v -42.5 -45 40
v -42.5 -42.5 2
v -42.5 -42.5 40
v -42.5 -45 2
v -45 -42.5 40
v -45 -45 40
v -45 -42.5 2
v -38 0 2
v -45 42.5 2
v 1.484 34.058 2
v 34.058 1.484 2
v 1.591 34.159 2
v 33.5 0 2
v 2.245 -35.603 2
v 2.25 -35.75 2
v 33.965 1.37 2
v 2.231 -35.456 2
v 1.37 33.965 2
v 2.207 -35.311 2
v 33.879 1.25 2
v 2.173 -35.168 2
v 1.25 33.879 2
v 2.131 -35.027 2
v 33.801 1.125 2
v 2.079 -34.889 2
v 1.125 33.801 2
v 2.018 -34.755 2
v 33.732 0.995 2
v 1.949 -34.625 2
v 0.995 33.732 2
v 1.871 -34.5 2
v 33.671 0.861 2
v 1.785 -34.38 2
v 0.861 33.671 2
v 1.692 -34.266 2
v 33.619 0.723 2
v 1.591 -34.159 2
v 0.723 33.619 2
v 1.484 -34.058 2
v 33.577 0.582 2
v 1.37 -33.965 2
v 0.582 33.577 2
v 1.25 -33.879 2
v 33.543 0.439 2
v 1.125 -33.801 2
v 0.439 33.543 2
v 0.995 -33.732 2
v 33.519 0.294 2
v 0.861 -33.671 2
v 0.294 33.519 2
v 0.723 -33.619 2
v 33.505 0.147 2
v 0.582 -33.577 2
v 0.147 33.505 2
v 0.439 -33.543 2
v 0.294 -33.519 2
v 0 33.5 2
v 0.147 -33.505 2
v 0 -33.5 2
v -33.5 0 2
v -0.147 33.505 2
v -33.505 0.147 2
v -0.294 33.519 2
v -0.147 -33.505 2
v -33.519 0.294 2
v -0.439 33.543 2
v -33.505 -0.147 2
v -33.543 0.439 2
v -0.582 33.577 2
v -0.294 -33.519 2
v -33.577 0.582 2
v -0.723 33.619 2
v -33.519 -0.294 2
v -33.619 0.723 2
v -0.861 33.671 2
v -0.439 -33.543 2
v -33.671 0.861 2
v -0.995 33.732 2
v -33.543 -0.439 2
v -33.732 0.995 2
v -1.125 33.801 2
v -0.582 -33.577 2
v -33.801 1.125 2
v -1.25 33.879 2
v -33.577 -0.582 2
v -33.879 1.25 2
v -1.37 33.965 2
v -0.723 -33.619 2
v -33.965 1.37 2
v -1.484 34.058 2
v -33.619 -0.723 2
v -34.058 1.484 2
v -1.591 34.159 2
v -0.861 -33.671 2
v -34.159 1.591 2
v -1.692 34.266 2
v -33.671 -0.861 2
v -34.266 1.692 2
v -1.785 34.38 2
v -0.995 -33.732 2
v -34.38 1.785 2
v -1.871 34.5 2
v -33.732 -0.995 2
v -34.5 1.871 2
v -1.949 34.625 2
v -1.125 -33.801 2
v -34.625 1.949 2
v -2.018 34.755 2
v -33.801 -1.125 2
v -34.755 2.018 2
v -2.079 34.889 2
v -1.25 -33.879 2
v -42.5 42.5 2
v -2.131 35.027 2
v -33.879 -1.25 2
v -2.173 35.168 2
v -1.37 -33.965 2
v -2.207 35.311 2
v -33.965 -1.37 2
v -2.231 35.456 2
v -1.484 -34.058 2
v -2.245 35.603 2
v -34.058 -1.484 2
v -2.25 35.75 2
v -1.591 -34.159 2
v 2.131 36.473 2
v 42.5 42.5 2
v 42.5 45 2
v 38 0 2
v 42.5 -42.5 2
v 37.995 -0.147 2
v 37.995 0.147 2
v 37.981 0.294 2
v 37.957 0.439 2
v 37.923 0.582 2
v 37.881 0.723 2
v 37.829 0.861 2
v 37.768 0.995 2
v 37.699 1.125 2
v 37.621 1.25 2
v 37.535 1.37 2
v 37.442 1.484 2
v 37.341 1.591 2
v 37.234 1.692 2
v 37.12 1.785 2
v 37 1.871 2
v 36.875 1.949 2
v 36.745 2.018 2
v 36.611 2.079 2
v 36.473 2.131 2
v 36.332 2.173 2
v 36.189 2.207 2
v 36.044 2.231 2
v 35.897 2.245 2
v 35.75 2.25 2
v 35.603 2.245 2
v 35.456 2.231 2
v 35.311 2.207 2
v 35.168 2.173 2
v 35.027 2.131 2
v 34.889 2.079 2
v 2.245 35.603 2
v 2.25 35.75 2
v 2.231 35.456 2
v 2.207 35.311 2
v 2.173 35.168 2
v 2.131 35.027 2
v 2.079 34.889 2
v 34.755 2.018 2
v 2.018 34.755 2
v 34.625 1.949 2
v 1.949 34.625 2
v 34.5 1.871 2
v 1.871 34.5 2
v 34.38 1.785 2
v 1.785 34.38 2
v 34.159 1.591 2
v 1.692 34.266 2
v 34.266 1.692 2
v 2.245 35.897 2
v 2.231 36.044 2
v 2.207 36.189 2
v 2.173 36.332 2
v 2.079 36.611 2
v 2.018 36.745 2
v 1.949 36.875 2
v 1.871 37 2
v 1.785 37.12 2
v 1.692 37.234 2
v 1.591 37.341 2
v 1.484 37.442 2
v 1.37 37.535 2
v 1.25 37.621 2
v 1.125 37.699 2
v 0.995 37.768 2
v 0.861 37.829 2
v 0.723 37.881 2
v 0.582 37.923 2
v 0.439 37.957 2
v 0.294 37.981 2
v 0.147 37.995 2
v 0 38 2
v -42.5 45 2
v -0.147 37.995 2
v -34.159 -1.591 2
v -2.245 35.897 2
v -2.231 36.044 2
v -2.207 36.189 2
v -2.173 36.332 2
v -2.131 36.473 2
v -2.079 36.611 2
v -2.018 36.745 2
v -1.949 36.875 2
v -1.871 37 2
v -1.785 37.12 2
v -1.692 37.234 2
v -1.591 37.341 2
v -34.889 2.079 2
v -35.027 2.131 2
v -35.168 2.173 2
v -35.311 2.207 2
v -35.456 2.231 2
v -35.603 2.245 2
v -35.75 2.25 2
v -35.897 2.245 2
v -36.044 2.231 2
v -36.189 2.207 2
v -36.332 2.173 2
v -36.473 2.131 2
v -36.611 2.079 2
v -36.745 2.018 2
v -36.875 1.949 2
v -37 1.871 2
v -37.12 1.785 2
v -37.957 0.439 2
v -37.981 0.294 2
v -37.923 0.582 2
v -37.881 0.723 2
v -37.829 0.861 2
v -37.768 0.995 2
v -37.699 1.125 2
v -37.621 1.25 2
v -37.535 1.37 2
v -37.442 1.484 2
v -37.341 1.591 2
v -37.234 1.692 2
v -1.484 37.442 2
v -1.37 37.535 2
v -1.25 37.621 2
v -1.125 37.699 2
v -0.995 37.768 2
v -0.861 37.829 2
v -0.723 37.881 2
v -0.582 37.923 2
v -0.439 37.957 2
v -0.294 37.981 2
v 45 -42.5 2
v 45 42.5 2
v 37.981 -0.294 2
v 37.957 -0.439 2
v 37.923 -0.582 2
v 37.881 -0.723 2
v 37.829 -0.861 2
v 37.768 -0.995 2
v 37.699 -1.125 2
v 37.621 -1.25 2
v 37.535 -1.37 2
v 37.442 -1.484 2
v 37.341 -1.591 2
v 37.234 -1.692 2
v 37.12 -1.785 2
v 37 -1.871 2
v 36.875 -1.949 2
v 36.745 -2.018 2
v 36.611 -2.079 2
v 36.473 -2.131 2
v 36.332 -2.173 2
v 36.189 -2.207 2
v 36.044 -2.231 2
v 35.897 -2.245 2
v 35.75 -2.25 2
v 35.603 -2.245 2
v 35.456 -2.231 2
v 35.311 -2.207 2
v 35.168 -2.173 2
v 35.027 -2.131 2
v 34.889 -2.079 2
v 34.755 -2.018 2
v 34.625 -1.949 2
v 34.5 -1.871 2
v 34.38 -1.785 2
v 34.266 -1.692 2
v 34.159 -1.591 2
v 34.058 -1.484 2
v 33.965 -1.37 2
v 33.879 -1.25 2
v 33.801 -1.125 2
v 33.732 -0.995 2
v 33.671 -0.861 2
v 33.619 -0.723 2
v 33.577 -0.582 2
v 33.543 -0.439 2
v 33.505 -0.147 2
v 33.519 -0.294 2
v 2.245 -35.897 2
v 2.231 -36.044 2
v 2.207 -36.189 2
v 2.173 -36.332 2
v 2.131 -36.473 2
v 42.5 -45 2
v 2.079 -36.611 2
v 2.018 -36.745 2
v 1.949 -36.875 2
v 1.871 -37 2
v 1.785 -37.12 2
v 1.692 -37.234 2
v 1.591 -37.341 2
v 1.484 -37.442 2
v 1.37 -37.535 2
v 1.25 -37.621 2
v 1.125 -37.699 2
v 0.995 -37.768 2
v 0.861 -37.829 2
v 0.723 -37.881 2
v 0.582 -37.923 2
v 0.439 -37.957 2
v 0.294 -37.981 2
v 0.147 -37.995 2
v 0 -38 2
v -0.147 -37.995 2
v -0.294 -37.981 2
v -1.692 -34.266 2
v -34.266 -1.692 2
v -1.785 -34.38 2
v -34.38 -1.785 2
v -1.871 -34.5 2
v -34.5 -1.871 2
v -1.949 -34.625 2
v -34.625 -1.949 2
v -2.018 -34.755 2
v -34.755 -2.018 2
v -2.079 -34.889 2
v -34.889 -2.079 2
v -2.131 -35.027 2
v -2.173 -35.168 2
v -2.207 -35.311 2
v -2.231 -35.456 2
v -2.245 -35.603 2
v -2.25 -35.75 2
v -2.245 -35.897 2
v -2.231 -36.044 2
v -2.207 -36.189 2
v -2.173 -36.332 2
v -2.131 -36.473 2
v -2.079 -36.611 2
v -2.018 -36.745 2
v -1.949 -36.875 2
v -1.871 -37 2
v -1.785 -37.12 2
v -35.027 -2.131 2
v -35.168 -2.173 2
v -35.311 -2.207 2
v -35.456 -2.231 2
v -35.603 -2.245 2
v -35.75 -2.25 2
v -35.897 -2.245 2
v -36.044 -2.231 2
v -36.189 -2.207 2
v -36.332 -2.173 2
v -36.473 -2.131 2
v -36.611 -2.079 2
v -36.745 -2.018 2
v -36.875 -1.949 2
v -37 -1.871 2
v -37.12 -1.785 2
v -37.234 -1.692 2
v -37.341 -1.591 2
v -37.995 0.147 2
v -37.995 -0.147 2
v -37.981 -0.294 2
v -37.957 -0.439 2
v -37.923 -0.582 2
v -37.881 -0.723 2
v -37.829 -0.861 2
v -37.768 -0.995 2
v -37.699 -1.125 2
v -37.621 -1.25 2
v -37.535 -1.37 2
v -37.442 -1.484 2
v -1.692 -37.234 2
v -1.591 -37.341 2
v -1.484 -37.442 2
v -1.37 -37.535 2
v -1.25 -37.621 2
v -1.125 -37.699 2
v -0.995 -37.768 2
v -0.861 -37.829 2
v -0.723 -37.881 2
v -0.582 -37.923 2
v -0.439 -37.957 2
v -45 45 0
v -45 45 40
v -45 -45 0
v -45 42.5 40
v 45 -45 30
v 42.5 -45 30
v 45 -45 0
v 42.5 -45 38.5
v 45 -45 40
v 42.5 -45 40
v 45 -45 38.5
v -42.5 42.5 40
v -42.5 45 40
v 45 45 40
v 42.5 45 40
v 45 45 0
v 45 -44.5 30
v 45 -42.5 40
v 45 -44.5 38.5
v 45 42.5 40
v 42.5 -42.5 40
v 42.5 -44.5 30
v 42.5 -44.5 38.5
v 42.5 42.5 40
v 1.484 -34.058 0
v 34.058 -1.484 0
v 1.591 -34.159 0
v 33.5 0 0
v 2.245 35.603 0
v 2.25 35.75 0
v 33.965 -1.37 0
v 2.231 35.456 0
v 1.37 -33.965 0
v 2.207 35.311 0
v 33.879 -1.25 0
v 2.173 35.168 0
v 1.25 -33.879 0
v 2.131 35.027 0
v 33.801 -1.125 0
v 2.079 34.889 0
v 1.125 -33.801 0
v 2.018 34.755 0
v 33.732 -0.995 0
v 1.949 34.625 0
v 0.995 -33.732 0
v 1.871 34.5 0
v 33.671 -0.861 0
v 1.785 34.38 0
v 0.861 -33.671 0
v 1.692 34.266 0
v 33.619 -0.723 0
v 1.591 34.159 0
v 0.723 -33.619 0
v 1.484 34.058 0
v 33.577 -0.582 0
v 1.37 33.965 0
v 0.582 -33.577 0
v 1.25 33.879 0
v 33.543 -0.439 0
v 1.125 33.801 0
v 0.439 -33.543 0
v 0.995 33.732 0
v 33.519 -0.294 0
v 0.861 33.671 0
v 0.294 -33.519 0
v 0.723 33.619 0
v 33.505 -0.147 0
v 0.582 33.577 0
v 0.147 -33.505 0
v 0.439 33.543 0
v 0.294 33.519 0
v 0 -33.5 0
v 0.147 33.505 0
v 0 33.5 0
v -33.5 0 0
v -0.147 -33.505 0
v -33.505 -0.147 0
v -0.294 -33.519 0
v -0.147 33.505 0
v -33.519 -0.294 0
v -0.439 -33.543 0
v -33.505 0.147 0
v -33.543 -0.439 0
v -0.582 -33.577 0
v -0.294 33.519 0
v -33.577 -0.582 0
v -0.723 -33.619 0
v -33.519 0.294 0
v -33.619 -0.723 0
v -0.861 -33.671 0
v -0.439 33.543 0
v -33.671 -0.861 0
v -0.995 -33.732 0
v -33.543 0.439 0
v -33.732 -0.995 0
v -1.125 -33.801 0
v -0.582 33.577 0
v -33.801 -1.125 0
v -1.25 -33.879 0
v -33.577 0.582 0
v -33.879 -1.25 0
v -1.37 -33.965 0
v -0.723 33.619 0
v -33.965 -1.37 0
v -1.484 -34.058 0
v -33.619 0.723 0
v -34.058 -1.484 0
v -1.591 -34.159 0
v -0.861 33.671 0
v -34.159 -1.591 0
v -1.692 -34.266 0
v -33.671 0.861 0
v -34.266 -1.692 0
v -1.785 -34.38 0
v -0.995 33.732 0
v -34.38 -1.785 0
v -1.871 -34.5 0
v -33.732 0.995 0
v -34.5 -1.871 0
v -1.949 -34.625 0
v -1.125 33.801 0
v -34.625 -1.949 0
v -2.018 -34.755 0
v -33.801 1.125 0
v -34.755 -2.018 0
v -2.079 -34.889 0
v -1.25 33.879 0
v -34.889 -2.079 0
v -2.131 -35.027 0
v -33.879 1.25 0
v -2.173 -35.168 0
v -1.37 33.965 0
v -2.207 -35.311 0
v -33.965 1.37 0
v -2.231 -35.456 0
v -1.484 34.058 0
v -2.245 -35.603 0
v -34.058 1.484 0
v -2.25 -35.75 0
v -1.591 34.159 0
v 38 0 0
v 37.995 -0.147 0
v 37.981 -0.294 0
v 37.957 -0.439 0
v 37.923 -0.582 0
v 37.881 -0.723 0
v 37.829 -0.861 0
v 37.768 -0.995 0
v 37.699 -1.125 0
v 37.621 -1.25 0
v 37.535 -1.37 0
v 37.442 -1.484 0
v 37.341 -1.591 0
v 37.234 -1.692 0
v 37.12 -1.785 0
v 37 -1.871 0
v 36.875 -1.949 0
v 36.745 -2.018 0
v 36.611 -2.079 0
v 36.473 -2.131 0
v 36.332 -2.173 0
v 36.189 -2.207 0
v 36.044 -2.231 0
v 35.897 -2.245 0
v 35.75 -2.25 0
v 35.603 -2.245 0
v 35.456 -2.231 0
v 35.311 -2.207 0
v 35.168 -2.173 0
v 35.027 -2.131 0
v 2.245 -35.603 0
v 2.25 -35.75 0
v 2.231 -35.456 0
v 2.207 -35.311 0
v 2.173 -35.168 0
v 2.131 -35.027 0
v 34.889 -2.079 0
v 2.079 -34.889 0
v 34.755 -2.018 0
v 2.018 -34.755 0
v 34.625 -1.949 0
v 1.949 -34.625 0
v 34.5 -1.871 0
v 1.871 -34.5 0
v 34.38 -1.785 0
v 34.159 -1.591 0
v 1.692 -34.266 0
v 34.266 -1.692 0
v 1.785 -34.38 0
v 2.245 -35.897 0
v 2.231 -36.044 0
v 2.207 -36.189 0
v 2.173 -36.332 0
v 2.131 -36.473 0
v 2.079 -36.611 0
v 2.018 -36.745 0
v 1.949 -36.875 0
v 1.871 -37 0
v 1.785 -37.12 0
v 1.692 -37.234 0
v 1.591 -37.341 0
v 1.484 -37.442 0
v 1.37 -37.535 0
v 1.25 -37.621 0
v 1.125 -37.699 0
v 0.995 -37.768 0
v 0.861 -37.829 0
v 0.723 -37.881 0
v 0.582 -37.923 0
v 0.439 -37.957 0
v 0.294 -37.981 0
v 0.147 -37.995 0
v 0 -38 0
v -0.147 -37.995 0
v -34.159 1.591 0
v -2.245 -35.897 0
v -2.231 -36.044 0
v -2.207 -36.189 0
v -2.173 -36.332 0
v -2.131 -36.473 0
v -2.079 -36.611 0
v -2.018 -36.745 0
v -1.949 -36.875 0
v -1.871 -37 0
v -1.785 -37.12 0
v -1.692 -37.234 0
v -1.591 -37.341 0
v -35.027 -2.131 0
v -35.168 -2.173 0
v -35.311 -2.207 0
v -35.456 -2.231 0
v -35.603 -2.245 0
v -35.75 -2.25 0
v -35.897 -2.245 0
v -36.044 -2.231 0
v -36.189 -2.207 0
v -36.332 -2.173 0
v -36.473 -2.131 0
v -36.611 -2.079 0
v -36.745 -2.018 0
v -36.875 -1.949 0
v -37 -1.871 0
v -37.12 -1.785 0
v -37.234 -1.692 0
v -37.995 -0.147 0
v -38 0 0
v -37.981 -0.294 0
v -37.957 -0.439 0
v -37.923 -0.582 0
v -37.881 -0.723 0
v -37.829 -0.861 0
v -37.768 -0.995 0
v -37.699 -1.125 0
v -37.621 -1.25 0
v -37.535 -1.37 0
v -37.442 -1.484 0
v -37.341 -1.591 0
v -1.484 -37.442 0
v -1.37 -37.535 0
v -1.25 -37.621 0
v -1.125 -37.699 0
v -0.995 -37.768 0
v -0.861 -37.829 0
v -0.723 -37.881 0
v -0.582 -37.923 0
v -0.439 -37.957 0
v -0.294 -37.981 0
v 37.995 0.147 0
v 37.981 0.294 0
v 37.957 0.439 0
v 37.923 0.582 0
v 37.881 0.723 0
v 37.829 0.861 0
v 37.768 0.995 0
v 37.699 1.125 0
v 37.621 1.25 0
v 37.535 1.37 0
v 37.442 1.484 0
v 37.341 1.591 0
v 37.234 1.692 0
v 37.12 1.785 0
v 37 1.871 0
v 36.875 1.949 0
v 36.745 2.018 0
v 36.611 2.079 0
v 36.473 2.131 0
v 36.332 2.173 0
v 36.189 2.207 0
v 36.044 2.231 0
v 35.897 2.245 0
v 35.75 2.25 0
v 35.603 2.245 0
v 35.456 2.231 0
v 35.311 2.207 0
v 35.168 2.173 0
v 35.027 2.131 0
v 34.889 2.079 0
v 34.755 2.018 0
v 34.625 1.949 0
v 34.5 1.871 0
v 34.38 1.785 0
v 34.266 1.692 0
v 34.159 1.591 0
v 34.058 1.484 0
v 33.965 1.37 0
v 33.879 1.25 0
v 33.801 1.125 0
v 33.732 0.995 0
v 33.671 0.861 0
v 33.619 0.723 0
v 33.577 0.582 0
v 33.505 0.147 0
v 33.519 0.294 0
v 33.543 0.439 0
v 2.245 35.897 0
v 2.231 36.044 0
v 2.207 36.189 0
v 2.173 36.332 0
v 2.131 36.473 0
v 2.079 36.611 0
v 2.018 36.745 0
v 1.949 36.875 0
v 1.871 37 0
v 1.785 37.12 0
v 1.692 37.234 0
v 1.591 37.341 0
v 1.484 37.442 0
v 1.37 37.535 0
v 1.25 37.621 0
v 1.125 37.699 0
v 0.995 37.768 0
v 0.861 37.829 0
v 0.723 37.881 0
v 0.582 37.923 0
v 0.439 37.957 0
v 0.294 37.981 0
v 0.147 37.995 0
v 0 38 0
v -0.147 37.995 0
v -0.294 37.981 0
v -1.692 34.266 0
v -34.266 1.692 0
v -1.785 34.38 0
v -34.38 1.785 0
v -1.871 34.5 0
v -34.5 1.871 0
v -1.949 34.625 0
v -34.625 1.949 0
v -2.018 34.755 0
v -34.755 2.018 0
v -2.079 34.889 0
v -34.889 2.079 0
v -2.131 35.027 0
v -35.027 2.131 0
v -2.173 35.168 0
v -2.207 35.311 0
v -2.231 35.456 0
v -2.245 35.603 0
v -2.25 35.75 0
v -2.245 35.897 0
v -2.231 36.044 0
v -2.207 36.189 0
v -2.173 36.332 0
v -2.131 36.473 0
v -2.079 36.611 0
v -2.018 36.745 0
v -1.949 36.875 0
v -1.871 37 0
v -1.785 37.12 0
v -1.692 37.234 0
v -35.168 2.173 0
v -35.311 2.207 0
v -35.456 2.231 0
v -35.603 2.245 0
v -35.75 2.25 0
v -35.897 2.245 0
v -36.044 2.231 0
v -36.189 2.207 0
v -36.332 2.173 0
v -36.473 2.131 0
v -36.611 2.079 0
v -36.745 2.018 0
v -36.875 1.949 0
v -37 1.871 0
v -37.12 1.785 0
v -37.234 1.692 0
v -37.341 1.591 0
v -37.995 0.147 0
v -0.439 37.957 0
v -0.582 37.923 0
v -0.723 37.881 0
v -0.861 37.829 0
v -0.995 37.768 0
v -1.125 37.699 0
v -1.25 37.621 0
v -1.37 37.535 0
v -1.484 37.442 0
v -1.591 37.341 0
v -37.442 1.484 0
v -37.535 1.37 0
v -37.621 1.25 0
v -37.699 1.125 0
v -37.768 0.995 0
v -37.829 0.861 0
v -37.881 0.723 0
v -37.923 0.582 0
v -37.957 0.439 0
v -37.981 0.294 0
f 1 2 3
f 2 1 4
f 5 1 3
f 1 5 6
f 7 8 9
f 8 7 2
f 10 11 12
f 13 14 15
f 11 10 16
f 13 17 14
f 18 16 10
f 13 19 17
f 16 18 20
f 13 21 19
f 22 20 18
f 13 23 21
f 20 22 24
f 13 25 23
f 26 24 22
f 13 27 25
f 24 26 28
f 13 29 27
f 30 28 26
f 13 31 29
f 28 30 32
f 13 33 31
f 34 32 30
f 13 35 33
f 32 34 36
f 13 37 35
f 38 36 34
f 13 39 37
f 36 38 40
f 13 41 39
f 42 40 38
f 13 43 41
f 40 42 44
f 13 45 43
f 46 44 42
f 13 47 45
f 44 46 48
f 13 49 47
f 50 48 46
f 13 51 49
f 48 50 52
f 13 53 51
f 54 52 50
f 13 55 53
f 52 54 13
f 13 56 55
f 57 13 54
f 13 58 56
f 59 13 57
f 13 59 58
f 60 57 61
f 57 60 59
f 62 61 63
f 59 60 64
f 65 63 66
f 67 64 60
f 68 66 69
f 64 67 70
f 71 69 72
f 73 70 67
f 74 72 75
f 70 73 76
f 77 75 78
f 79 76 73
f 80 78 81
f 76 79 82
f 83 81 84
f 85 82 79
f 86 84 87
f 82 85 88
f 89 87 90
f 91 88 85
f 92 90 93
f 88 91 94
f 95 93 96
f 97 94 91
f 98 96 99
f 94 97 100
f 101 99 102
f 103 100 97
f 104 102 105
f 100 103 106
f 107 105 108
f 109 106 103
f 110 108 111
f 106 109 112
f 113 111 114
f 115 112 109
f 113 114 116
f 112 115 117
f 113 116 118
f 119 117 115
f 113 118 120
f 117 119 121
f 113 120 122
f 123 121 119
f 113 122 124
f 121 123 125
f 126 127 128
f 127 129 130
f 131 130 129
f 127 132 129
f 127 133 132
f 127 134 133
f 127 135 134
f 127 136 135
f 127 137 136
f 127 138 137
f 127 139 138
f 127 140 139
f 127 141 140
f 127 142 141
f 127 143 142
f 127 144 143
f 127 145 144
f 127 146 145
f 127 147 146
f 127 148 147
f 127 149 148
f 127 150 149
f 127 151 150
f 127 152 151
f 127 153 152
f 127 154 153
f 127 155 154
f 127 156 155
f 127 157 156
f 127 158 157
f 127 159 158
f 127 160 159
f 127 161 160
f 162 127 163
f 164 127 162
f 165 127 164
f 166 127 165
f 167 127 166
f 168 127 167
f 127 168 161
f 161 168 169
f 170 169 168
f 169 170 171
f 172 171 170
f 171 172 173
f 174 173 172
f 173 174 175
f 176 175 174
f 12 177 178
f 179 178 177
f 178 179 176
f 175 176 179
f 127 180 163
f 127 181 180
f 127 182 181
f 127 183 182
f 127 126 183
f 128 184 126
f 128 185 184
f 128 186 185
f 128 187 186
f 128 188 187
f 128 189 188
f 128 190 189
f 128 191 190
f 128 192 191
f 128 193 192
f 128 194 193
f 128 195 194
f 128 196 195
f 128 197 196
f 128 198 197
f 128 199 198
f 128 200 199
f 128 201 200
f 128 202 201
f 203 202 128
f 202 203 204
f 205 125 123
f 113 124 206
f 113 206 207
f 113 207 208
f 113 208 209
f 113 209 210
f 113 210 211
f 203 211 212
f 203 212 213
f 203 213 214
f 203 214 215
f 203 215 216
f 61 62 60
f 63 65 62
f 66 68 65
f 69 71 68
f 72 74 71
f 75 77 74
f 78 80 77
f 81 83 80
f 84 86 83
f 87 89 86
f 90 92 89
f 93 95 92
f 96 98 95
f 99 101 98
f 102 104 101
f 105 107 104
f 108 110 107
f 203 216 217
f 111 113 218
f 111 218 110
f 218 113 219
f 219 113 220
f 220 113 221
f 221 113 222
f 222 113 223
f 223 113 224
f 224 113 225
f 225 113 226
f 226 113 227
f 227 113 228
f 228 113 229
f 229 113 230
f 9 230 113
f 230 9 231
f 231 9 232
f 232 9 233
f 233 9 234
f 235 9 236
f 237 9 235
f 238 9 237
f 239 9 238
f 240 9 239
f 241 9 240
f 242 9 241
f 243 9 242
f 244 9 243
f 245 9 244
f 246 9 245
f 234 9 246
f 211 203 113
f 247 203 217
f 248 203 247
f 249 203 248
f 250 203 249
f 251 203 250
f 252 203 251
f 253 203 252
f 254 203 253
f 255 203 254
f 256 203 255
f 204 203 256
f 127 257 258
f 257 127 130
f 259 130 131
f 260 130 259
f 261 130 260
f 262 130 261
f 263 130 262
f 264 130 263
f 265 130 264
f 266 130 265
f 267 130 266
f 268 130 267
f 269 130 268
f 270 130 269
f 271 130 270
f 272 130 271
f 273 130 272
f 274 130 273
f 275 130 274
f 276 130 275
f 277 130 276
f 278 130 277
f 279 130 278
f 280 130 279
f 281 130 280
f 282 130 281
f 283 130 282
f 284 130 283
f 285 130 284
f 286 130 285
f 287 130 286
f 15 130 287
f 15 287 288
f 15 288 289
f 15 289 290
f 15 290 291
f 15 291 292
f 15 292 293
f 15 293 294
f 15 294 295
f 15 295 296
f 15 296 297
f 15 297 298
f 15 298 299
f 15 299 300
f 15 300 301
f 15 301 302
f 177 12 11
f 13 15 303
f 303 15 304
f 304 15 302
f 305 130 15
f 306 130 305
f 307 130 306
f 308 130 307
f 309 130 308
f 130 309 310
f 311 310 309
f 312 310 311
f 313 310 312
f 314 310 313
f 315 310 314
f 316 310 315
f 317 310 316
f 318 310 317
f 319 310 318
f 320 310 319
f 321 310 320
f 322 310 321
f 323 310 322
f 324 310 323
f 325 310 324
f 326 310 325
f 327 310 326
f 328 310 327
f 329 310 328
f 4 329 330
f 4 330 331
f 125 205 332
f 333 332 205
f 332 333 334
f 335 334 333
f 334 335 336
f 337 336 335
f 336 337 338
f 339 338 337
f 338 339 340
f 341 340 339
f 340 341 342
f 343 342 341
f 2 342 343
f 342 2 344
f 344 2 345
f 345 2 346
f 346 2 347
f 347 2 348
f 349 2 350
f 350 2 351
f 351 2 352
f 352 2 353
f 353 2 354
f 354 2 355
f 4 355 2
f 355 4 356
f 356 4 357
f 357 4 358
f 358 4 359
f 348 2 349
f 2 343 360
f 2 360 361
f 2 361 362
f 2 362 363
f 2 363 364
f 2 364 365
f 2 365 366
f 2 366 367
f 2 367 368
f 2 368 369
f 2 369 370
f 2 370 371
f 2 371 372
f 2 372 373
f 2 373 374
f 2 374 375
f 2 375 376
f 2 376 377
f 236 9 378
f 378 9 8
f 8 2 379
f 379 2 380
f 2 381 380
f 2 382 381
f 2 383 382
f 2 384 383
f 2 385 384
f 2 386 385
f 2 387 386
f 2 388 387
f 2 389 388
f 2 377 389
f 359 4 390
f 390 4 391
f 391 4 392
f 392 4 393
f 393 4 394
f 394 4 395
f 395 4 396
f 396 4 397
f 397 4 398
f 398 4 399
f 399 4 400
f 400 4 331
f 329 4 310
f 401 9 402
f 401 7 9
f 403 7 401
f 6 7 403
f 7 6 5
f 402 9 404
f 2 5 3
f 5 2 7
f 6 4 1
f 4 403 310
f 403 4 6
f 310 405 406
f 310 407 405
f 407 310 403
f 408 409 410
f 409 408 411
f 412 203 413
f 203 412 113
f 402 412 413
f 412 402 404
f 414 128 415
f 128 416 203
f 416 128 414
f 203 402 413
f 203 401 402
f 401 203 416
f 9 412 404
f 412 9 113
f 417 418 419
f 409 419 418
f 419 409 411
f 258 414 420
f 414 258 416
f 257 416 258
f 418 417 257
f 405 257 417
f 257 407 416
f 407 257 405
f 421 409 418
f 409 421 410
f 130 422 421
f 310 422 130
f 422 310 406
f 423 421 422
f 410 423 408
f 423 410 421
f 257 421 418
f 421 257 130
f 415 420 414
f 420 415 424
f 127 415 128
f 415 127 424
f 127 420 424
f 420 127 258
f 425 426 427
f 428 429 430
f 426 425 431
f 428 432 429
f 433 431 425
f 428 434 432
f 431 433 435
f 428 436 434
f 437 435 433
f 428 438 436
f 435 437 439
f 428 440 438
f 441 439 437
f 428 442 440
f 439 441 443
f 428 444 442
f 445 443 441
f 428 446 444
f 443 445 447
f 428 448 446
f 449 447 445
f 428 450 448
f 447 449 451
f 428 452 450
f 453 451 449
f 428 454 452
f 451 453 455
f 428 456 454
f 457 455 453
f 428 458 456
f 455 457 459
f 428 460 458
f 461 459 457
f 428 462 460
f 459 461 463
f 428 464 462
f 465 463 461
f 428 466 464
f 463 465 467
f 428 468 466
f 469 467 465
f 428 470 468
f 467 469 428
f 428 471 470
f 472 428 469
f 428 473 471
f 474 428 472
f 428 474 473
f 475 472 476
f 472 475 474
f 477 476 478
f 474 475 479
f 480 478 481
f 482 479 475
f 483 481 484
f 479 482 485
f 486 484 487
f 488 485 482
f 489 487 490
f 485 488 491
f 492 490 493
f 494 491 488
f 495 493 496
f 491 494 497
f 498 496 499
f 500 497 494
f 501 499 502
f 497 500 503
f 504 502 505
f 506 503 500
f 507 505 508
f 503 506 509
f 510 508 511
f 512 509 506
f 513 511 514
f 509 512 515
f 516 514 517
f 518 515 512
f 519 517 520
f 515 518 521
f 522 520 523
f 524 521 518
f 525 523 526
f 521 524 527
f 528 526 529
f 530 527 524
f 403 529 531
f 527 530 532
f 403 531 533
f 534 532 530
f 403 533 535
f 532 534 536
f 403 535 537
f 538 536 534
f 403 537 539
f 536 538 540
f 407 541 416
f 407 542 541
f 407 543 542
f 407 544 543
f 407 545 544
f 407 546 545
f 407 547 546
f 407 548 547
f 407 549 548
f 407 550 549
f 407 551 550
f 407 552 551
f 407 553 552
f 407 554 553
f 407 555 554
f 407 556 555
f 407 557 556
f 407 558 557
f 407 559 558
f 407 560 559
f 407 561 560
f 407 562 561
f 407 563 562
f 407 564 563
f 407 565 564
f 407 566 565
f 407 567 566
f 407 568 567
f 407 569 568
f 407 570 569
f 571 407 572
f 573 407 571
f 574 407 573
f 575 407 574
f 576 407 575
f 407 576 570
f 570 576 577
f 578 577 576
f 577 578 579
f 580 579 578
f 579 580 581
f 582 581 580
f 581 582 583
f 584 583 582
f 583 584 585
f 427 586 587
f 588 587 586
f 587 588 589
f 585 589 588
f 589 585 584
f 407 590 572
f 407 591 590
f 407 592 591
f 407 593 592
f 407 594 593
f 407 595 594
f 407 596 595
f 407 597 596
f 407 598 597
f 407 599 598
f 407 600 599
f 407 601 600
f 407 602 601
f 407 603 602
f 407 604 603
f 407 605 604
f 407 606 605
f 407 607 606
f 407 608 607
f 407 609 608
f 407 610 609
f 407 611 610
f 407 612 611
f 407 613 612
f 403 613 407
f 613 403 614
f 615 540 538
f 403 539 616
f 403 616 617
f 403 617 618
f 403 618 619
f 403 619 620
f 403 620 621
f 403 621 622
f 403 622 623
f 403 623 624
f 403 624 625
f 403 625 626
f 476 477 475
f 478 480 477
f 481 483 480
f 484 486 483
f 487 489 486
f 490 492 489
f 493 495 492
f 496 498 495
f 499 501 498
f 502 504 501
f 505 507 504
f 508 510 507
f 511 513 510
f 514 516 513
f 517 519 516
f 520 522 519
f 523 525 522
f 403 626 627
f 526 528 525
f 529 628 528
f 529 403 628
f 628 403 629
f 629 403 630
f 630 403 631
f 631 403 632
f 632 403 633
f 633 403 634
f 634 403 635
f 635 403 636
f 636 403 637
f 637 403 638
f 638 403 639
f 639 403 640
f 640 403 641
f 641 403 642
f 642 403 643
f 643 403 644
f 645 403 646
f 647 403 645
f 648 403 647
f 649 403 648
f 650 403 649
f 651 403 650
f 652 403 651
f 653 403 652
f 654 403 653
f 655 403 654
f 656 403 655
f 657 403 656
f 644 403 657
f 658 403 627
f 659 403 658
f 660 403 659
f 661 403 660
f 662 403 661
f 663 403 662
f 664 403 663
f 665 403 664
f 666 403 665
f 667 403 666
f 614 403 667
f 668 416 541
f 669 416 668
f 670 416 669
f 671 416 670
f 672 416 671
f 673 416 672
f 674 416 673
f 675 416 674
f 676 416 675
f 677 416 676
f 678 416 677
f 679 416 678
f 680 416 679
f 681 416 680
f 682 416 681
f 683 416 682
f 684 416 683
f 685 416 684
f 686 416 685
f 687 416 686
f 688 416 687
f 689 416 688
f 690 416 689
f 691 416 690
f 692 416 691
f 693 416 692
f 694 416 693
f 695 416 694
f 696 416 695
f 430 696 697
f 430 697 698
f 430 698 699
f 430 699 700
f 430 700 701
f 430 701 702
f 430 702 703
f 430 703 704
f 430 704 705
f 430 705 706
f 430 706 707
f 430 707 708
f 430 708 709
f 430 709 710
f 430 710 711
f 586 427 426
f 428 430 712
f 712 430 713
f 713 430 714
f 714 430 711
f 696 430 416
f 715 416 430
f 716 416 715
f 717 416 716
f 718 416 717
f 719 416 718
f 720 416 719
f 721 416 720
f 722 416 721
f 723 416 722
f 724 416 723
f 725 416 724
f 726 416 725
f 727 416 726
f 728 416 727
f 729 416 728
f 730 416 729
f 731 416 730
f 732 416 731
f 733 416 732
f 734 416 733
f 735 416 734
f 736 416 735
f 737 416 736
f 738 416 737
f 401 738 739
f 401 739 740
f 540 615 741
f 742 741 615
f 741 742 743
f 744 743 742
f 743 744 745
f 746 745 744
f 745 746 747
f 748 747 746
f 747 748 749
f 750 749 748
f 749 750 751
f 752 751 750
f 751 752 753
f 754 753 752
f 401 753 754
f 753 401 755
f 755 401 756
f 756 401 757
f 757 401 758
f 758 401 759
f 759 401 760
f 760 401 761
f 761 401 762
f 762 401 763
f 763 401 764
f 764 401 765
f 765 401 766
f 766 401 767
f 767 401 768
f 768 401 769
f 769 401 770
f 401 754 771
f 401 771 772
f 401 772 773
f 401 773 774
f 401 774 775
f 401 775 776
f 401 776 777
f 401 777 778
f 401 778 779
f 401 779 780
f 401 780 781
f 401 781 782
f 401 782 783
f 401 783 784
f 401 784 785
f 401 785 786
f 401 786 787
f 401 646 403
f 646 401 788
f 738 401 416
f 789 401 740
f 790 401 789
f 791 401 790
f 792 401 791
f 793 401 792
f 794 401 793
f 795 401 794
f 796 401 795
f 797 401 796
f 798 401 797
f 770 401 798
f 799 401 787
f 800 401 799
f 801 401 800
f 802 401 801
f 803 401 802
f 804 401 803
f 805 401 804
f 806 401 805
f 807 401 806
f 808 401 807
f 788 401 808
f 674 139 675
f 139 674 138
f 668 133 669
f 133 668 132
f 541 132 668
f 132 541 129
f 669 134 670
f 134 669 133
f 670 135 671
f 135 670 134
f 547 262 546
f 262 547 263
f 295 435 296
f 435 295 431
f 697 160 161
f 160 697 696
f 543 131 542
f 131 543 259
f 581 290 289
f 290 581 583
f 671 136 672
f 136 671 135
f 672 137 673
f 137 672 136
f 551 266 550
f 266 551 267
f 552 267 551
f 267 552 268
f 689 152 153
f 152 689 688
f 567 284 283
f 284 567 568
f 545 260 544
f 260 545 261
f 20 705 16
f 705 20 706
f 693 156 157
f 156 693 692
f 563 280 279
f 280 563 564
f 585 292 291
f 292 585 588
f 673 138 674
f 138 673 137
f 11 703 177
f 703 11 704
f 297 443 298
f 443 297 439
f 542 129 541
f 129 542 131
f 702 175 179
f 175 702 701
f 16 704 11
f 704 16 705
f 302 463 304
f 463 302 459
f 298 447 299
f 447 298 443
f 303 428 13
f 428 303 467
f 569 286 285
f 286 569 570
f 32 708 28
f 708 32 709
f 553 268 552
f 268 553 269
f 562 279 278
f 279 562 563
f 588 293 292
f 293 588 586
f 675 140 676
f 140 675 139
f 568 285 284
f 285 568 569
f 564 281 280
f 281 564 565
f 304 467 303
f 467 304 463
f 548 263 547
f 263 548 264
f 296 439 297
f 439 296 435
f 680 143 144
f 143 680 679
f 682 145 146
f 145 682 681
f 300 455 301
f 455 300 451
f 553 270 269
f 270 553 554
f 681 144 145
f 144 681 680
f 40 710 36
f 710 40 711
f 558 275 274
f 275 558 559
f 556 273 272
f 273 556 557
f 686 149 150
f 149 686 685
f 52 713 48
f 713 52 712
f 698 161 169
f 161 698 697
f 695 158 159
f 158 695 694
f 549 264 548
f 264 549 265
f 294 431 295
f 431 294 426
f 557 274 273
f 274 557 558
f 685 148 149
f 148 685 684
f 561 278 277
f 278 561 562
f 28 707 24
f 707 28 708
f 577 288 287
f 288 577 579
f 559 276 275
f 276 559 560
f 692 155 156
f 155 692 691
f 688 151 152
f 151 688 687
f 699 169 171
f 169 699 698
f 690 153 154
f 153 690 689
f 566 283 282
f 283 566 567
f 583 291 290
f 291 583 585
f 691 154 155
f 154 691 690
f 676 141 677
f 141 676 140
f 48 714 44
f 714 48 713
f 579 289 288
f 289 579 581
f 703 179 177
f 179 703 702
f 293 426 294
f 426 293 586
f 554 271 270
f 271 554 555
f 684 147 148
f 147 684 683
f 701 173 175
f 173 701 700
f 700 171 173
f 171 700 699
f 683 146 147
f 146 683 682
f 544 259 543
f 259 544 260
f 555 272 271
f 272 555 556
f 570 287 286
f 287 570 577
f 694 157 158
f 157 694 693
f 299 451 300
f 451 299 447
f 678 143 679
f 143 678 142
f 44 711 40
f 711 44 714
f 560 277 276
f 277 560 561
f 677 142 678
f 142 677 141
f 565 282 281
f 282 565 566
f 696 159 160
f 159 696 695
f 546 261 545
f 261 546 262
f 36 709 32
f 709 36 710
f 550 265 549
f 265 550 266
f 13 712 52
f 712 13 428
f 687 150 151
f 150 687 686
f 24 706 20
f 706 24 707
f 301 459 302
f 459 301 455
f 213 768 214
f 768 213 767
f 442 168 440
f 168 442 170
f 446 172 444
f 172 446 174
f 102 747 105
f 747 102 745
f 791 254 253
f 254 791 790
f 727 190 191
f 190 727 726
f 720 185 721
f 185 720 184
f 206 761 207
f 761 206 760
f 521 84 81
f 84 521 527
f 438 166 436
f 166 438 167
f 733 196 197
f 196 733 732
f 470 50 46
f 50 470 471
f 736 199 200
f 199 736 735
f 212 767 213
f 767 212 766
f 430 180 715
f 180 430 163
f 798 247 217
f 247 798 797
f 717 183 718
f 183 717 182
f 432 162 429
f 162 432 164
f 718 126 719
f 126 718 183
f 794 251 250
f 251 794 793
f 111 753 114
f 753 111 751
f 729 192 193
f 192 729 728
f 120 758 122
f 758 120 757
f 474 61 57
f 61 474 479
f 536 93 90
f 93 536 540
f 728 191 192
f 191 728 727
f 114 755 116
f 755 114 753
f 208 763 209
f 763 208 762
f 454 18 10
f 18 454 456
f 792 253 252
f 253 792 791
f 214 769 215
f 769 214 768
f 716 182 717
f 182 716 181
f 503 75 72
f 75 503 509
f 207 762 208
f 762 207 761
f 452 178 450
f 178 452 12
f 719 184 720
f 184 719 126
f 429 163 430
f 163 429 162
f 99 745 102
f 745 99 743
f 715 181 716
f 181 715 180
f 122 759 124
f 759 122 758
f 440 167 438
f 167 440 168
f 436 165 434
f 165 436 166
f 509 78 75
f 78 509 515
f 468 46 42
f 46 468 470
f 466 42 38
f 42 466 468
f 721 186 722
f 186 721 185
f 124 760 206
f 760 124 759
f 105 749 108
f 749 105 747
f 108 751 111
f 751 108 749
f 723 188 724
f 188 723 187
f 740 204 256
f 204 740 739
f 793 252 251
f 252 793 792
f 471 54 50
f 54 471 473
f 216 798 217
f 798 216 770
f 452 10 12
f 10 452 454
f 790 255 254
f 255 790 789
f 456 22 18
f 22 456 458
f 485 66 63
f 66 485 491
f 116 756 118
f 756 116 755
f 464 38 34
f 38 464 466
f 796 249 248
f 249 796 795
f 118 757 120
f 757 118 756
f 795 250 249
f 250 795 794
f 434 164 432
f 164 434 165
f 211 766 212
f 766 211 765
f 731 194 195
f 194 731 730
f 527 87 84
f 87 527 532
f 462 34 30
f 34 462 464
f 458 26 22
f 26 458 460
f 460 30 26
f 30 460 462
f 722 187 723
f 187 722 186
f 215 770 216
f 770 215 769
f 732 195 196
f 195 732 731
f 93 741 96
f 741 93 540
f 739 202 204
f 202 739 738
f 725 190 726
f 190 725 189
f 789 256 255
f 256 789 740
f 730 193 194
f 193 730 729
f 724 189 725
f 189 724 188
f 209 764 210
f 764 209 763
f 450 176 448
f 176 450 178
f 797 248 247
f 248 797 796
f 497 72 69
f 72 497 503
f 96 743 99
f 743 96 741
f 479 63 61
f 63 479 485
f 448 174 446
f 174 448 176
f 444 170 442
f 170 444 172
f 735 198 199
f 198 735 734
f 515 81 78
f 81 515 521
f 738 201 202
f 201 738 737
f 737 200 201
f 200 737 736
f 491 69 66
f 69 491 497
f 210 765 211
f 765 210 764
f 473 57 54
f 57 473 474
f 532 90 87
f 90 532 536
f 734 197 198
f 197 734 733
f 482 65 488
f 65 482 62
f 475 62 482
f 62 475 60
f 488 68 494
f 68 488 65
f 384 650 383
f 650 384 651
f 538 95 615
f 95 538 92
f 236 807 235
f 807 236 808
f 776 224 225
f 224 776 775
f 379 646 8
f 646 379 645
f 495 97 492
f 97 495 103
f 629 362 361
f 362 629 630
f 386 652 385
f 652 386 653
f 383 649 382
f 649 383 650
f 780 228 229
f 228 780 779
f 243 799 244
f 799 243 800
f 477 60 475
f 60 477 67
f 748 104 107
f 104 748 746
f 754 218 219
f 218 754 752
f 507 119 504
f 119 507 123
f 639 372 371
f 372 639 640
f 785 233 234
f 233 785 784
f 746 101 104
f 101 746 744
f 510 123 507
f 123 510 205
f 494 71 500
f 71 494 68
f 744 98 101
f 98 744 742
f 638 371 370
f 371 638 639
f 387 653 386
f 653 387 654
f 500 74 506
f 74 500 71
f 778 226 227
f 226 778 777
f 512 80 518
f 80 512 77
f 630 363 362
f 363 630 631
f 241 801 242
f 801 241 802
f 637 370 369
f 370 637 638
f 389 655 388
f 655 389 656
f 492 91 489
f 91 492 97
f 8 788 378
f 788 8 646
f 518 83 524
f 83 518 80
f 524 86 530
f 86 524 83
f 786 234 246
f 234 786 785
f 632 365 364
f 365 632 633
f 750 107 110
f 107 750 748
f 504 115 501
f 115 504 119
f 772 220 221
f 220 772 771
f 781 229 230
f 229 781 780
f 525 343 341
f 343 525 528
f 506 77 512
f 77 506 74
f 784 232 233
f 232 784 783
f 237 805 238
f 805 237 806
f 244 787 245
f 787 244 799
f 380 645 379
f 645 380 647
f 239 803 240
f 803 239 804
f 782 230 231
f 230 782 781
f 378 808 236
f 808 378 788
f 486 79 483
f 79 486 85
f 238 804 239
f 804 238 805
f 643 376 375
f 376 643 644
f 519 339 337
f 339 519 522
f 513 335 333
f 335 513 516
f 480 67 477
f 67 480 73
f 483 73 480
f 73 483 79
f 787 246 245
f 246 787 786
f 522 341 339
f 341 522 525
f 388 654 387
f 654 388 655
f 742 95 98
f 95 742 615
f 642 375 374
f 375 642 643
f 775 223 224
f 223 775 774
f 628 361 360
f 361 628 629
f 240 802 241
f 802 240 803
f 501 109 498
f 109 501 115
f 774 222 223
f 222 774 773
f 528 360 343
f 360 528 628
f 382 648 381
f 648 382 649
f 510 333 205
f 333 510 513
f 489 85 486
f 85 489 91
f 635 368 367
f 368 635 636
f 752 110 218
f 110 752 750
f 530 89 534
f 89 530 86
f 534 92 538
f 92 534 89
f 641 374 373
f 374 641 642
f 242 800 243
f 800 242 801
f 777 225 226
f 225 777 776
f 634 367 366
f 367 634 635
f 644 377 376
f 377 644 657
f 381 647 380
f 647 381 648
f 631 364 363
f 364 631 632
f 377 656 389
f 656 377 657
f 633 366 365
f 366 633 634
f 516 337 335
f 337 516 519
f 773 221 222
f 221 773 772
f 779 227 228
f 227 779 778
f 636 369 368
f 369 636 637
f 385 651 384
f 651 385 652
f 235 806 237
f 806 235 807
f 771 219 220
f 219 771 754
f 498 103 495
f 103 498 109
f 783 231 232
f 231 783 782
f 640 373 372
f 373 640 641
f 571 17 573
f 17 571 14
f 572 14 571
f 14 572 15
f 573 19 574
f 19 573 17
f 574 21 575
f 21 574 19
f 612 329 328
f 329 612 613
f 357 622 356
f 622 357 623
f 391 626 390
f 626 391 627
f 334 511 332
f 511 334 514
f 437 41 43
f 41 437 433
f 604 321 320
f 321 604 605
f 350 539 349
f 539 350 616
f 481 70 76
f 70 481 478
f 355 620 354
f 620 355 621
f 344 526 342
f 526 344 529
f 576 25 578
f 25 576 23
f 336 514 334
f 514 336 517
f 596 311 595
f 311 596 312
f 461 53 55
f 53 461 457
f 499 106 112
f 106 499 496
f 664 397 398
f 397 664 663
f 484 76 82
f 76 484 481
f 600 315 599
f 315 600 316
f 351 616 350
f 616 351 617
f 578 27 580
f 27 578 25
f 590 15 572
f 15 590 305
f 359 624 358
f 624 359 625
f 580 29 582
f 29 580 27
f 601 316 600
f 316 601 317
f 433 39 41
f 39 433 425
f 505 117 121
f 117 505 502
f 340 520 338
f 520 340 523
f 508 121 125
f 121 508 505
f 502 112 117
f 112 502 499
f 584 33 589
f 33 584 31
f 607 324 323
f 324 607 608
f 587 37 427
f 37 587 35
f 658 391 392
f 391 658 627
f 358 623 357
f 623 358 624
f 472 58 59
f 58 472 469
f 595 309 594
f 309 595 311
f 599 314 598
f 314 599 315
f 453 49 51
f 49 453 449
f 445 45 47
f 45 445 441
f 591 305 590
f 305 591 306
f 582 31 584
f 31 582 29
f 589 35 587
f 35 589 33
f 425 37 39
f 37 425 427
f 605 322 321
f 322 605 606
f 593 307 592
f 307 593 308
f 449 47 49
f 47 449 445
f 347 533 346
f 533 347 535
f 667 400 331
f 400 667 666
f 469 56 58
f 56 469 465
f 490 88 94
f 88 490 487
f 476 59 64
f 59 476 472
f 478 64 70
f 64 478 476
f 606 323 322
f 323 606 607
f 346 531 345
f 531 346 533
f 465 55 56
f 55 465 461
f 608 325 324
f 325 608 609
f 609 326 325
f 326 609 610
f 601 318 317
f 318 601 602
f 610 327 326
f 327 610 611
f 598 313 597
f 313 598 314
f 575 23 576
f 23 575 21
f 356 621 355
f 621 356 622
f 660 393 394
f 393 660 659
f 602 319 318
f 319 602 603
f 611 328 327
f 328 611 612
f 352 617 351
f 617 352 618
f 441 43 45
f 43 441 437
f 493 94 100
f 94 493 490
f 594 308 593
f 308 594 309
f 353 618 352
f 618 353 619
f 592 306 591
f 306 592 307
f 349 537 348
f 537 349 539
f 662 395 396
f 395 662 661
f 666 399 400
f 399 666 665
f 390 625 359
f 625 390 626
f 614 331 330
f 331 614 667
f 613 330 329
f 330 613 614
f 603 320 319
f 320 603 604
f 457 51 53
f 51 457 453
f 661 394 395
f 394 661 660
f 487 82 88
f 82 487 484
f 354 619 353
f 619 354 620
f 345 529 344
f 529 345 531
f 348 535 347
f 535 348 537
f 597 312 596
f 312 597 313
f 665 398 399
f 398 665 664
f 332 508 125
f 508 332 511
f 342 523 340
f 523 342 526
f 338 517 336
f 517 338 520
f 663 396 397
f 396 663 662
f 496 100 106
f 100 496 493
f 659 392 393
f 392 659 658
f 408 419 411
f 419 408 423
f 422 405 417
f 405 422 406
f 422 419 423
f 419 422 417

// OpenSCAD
// DIY magnetic stirrer housing for 80 mm PC case fan
// Print orientation: upside-down open box, top plate on bed (z = 0 to 2)

// ---------- Parameters ----------
top_thickness      = 2;     // top plate thickness
wall_thickness     = 2.5;   // wall thickness
box_height         = 40;    // total height of walls (z = 0 to 40)
outer_size         = 90;    // outer X and Y size of box
screw_hole_d       = 4.5;   // M4 screw hole diameter
screw_hole_count   = 4;     // number of screw holes
screw_hole_pitch   = 71.5;  // square pattern size for holes
cable_notch_w      = 12;    // cable notch width
cable_notch_depth  = 8;     // notch depth from open edge (z = 32 to 40)
eps                = 0.5;   // overcut for clean differences
$fn                = 96;    // curve resolution

// ---------- Model ----------
difference() {
    union() {
        // Top plate
        translate([-outer_size/2, -outer_size/2, 0])
            cube([outer_size, outer_size, top_thickness]);

        // Walls, open top
        for (sx = [-1, 1], sy = [-1, 1])
            translate([sx > 0 ? outer_size/2 - wall_thickness : -outer_size/2,
                       sy > 0 ? outer_size/2 - wall_thickness : -outer_size/2,
                       top_thickness])
                cube([wall_thickness, wall_thickness, box_height - top_thickness]);
    }

    // Screw holes through top plate
    for (i = [0 : screw_hole_count - 1]) {
        angle = i * 90;
        translate([screw_hole_pitch/2 * cos(angle), screw_hole_pitch/2 * sin(angle), -eps])
            cylinder(d = screw_hole_d, h = top_thickness + 2 * eps);
    }

    // Cable notch in one wall (from z = 32 to z = 40)
    translate([outer_size/2 - wall_thickness - cable_notch_w/2,
               -outer_size/2 - eps,
               box_height - top_thickness - cable_notch_depth])
        cube([cable_notch_w, 2 * eps, cable_notch_depth + eps]);
}
